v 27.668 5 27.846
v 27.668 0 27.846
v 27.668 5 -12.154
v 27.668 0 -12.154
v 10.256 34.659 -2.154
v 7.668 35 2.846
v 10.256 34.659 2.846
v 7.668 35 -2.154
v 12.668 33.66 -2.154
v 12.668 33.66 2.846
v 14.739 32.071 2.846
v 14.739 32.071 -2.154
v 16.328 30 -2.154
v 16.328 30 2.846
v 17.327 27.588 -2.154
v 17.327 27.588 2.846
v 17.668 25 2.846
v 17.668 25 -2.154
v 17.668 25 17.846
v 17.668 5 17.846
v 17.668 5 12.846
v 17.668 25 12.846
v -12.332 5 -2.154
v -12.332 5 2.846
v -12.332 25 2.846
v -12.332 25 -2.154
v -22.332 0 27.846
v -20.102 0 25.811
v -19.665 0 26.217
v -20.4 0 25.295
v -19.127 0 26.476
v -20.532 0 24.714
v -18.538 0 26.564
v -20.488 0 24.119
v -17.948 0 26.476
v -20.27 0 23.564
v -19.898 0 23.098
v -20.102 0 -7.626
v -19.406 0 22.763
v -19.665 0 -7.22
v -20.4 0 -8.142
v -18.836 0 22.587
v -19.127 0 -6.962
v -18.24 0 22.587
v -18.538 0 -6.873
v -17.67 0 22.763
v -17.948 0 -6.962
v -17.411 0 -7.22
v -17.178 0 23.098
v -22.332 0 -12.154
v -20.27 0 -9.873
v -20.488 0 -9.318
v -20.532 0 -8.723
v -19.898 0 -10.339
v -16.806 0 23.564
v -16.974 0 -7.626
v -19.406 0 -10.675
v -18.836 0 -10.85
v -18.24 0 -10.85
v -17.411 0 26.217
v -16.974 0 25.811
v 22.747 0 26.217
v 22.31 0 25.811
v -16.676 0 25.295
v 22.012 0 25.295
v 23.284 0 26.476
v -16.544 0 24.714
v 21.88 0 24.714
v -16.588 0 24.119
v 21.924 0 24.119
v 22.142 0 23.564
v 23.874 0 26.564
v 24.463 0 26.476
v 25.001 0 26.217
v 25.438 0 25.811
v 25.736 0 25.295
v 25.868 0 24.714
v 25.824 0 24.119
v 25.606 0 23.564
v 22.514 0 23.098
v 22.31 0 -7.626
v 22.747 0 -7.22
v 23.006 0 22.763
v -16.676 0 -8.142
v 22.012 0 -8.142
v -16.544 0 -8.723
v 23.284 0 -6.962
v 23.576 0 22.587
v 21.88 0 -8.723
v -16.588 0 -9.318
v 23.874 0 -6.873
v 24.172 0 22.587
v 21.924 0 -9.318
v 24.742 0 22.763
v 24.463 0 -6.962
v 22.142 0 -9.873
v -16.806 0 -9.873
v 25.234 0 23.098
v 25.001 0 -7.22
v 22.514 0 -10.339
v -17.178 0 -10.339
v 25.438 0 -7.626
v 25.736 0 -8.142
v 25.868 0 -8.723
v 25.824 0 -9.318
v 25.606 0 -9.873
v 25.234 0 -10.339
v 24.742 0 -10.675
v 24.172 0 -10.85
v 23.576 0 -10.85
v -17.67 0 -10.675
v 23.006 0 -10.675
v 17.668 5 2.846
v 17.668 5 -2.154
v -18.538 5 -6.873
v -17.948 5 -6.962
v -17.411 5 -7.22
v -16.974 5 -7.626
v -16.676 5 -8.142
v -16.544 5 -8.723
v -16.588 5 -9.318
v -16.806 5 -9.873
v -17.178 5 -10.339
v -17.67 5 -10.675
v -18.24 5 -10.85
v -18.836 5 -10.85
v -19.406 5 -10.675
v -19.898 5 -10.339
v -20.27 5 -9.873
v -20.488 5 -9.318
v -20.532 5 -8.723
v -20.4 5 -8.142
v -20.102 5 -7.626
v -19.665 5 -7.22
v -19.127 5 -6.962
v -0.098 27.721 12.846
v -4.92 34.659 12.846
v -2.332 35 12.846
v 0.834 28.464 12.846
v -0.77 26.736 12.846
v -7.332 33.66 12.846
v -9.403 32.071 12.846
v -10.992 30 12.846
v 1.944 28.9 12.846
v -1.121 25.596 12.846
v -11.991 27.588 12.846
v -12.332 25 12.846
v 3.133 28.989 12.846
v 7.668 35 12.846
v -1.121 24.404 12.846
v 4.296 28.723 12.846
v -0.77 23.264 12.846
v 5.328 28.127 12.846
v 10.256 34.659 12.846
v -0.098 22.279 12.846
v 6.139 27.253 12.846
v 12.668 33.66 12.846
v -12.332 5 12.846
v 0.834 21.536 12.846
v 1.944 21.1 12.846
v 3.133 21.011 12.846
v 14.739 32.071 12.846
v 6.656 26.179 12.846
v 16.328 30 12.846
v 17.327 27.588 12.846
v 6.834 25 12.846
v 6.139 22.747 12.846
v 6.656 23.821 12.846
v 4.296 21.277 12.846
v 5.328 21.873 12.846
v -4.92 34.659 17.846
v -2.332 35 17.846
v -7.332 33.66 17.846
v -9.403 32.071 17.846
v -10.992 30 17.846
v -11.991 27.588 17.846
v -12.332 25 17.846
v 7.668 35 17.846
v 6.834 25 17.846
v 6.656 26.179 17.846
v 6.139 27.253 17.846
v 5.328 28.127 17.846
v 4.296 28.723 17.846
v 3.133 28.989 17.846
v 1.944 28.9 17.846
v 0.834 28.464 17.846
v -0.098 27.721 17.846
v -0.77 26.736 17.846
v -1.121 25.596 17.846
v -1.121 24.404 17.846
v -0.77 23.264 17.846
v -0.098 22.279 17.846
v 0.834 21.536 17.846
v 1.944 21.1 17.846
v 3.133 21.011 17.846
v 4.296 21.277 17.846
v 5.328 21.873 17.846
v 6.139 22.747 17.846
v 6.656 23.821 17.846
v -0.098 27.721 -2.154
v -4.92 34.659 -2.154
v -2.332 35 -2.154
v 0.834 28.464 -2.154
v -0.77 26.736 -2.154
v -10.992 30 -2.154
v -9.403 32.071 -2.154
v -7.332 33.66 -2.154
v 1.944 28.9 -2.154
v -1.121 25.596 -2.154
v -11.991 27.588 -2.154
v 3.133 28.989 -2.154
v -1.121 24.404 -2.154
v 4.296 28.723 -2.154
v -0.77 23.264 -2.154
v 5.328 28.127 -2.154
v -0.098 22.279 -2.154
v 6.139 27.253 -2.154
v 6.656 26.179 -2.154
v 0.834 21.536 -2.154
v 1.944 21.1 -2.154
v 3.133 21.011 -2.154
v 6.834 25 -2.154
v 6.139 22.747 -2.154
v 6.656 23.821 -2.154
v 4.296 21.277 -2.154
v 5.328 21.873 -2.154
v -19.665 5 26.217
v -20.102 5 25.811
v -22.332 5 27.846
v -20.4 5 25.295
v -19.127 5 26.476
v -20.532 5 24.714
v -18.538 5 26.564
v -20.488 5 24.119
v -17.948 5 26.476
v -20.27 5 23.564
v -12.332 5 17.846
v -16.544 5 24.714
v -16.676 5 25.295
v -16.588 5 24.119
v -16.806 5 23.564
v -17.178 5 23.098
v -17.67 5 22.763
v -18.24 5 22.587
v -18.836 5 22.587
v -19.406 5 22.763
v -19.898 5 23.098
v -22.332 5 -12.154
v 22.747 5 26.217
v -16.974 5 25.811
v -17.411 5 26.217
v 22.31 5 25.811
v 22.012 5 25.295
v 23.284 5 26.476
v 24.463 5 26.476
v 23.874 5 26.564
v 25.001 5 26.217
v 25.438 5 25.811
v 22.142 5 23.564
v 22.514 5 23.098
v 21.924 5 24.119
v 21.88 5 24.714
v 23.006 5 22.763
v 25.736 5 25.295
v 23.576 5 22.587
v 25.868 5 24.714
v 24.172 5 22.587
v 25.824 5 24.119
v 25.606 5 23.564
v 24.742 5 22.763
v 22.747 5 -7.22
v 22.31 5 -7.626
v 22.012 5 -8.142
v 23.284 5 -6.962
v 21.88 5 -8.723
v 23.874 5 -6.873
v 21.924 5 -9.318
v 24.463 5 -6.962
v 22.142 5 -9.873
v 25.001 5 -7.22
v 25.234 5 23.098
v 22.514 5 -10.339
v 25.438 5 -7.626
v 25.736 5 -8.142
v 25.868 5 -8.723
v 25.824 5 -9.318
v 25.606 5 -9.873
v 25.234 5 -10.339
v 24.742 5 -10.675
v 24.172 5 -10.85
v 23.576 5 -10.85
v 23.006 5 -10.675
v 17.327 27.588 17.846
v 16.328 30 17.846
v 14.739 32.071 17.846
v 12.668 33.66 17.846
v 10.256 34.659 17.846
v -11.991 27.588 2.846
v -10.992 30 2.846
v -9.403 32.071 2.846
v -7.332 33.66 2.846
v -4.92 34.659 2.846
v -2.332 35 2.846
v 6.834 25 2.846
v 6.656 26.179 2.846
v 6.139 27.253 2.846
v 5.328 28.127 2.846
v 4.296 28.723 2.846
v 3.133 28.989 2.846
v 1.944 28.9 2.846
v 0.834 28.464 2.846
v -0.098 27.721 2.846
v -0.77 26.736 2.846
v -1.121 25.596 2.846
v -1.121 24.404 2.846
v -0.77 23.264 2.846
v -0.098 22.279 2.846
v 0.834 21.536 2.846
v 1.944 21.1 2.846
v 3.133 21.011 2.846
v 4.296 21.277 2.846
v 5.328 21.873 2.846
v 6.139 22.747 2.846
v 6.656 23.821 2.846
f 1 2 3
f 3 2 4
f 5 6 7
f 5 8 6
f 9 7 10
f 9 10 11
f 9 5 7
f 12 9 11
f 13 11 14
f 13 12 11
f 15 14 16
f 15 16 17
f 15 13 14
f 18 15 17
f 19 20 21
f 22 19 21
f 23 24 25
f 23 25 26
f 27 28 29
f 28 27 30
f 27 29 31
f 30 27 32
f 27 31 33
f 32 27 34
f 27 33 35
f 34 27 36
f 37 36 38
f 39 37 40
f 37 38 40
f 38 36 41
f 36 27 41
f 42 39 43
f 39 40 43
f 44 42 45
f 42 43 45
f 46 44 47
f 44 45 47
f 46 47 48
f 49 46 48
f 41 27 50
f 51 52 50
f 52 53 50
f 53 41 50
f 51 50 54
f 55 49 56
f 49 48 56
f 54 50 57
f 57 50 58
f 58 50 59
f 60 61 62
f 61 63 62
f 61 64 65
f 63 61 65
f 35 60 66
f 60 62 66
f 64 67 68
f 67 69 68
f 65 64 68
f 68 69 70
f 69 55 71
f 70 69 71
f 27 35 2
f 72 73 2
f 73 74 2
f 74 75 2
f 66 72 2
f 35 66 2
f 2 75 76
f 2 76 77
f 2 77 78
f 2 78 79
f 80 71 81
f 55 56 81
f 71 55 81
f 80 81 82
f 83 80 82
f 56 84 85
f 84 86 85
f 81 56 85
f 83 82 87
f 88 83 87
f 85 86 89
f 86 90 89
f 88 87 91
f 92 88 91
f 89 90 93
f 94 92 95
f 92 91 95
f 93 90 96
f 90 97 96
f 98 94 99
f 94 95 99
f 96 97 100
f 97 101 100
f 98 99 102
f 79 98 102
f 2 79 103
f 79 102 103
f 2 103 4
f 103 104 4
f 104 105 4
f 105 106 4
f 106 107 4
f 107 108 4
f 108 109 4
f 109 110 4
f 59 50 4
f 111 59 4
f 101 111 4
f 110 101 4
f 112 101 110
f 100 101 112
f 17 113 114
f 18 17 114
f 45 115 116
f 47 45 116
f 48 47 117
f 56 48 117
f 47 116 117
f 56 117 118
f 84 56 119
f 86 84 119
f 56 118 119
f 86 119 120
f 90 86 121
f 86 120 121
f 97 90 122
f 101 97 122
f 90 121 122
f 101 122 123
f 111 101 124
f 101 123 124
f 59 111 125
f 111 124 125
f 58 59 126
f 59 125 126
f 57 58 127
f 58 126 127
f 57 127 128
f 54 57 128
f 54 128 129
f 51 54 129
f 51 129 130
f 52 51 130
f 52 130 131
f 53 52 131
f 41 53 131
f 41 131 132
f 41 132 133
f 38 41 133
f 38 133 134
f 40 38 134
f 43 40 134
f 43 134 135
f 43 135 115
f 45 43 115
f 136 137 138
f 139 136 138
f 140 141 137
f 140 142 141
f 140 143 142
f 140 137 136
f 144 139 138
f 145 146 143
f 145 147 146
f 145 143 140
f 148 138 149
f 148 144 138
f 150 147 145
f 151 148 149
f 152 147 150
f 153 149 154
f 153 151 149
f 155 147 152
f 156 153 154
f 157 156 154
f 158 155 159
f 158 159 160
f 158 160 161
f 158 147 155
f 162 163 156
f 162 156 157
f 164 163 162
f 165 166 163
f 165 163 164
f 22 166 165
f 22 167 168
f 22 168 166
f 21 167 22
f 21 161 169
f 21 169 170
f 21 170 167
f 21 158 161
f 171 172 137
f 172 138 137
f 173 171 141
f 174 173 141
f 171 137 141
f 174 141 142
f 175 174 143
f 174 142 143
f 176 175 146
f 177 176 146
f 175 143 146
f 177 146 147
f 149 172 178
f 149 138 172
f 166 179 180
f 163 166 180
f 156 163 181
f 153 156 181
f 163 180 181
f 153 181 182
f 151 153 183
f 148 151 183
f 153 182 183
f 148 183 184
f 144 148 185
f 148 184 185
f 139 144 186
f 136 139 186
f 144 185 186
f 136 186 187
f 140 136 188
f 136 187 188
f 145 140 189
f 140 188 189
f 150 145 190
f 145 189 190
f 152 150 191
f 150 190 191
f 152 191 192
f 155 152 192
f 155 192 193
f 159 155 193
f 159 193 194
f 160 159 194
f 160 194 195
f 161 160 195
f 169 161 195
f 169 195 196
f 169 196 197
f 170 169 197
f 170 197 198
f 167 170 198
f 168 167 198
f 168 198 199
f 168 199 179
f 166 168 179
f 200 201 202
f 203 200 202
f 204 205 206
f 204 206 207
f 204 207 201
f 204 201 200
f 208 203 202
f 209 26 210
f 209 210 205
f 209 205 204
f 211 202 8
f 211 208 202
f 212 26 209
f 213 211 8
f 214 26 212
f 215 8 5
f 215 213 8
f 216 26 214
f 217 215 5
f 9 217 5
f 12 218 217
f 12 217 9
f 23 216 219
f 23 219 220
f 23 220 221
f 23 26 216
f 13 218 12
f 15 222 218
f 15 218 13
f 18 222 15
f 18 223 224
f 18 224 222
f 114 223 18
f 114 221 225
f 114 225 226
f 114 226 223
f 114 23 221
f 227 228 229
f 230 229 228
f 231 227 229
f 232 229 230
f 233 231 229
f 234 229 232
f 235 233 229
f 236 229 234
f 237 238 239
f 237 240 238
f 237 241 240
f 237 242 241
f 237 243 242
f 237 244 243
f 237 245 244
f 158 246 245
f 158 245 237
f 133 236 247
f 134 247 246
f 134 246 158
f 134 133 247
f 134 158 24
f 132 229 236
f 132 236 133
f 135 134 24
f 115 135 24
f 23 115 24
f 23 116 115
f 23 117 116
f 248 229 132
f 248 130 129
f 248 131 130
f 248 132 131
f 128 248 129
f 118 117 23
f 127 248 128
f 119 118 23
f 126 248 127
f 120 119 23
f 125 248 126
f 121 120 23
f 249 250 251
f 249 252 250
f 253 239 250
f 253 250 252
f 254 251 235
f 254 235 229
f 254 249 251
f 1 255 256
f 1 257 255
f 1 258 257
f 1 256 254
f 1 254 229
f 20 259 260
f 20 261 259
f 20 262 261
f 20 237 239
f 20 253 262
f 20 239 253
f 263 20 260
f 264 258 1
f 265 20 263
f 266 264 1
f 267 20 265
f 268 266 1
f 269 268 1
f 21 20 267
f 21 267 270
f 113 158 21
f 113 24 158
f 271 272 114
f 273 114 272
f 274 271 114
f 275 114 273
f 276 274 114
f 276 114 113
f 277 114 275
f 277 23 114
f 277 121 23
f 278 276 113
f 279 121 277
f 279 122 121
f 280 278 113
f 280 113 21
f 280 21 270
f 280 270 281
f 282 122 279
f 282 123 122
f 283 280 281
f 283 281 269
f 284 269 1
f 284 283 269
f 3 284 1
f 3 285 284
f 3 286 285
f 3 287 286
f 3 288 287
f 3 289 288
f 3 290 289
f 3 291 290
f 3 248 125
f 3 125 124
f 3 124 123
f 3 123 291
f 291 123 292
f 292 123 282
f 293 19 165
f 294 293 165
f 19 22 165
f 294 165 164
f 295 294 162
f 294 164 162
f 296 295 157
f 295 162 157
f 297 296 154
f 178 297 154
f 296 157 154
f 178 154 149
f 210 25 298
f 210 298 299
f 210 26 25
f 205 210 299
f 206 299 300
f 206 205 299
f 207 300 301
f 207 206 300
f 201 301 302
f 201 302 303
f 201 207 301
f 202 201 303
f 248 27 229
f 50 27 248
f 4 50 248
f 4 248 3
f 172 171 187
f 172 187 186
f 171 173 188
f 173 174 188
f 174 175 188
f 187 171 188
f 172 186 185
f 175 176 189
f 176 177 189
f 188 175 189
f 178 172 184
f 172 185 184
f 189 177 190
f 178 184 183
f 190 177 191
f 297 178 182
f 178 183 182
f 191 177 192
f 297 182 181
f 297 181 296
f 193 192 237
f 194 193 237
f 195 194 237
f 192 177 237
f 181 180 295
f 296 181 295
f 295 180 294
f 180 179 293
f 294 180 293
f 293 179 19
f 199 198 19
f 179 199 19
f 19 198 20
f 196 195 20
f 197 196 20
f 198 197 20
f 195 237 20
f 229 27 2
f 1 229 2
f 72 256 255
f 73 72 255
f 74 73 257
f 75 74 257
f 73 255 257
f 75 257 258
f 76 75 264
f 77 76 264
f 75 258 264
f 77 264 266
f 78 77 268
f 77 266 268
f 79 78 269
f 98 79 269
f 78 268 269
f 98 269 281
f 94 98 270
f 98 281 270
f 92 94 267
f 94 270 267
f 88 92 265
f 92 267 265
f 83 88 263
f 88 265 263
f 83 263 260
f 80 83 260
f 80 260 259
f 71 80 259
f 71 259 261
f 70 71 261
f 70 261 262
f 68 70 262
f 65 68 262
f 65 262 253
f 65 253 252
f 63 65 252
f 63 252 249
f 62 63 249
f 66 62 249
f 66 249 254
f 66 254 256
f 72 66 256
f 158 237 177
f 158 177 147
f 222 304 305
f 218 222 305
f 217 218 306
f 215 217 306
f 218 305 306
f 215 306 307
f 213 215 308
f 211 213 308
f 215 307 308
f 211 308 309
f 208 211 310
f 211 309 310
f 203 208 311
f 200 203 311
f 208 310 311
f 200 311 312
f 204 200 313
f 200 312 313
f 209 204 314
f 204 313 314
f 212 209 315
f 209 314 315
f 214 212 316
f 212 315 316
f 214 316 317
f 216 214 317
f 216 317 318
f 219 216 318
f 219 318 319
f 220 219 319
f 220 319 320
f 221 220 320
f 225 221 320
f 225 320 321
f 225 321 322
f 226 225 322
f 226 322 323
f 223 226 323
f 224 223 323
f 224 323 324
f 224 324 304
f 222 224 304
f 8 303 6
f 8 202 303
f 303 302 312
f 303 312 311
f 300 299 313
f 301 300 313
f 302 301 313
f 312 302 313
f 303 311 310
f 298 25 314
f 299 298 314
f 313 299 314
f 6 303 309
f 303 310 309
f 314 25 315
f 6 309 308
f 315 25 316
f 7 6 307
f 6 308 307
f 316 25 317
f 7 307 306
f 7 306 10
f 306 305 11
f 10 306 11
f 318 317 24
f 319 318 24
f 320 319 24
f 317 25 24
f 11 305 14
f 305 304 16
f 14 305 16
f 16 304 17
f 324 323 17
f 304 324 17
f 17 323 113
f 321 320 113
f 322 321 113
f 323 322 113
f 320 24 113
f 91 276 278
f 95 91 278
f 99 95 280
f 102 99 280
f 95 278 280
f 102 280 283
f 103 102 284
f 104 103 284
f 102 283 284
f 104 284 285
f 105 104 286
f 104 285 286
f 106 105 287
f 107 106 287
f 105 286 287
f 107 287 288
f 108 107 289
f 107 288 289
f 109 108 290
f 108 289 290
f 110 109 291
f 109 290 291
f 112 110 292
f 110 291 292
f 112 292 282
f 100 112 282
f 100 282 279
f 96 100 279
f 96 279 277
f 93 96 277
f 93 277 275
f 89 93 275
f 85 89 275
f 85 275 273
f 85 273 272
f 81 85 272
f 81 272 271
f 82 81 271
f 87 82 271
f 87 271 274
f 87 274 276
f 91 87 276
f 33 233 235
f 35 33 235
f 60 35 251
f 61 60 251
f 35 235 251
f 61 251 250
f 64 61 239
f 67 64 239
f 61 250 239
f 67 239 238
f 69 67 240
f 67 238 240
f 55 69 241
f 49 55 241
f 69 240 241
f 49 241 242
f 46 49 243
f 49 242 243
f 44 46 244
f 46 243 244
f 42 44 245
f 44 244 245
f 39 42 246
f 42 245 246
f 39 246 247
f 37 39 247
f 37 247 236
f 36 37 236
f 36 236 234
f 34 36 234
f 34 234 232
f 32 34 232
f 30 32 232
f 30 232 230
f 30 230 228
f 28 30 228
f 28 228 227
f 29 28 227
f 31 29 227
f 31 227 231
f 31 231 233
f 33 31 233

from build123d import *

# Parameters (mm, degrees)
SKETCH1_W           = 50
SKETCH1_H           = 40
BOSS_EXTRUDE1_DEPTH = 5
SKETCH2_W           = 30
SKETCH2_H           = 5
BOSS_EXTRUDE2_DEPTH = 35
FILLET1_R           = 10
FILLET2_R           = 10
FILLET3_R           = 10
FILLET4_R           = 10
SKETCH3_R           = 4
CUT_EXTRUDE1_DEPTH  = 35
SKETCH5_R           = 2
CUT_EXTRUDE3_DEPTH  = 35
SKETCH5_4_R         = 2
CUT_EXTRUDE4_DEPTH  = 35


with BuildPart() as part:
    # Sketch1 → Boss-Extrude1 (new body)
    with BuildSketch(Plane(origin=(0, 0, 0), x_dir=(1, 0, 0), z_dir=(0, 1, 0))):
        with Locations((2.66798419, -7.845849802)):
            Rectangle(SKETCH1_W, SKETCH1_H)
    extrude(amount=BOSS_EXTRUDE1_DEPTH)

    # Sketch2 → Boss-Extrude2 (add)
    with BuildSketch(Plane(origin=(0, 0, 0), x_dir=(1, 0, 0), z_dir=(0, 1, 0))):
        with Locations((2.66798419, -15.345849802)):
            Rectangle(SKETCH2_W, SKETCH2_H)
        with Locations((2.66798419, -0.345849802)):
            Rectangle(SKETCH2_W, SKETCH2_H)
    extrude(amount=BOSS_EXTRUDE2_DEPTH)

    # Fillet1
    fillet1_edges = [part.edges().sort_by_distance(p)[0] for p in [
        (17.66798419, 35, 15.345849802),
    ]]
    fillet(fillet1_edges, radius=FILLET1_R)

    # Fillet2
    fillet2_edges = [part.edges().sort_by_distance(p)[0] for p in [
        (-12.33201581, 35, 15.345849802),
    ]]
    fillet(fillet2_edges, radius=FILLET2_R)

    # Fillet3
    fillet3_edges = [part.edges().sort_by_distance(p)[0] for p in [
        (-12.33201581, 35, 0.345849802),
    ]]
    fillet(fillet3_edges, radius=FILLET3_R)

    # Fillet4
    fillet4_edges = [part.edges().sort_by_distance(p)[0] for p in [
        (17.66798419, 35, 0.345849802),
    ]]
    fillet(fillet4_edges, radius=FILLET4_R)

    # Sketch3 → Cut-Extrude1 (cut)
    with BuildSketch(Plane.XY.offset(17.845849802)):
        with Locations((2.834176639, 25)):
            Circle(SKETCH3_R)
    extrude(amount=-CUT_EXTRUDE1_DEPTH, mode=Mode.SUBTRACT)

    # Sketch5 → Cut-Extrude3 (cut)
    with BuildSketch(Plane(origin=(0, 5, 0), x_dir=(1, 0, 0), z_dir=(0, 1, 0))):
        with Locations(Location((-18.537983824, 8.872799407, 0), (0, 0, 270))):
            Circle(SKETCH5_R)
    extrude(amount=-CUT_EXTRUDE3_DEPTH, mode=Mode.SUBTRACT)

    # Sketch5<4> → Cut-Extrude4 (cut)
    with BuildSketch(Plane(origin=(0, 5, 0), x_dir=(1, 0, 0), z_dir=(0, 1, 0))):
        with Locations(Location((23.873952204, -24.564499012, 0), (0, 0, 270))):
            Circle(SKETCH5_4_R)
        with Locations(Location((-18.537983824, -24.564499012, 0), (0, 0, 270))):
            Circle(SKETCH5_4_R)
        with Locations(Location((23.873952204, 8.872799407, 0), (0, 0, 270))):
            Circle(SKETCH5_4_R)
        with Locations(Location((-18.537983824, 8.872799407, 0), (0, 0, 270))):
            Circle(SKETCH5_4_R)
    extrude(amount=-CUT_EXTRUDE4_DEPTH, mode=Mode.SUBTRACT)


solid = part.part
